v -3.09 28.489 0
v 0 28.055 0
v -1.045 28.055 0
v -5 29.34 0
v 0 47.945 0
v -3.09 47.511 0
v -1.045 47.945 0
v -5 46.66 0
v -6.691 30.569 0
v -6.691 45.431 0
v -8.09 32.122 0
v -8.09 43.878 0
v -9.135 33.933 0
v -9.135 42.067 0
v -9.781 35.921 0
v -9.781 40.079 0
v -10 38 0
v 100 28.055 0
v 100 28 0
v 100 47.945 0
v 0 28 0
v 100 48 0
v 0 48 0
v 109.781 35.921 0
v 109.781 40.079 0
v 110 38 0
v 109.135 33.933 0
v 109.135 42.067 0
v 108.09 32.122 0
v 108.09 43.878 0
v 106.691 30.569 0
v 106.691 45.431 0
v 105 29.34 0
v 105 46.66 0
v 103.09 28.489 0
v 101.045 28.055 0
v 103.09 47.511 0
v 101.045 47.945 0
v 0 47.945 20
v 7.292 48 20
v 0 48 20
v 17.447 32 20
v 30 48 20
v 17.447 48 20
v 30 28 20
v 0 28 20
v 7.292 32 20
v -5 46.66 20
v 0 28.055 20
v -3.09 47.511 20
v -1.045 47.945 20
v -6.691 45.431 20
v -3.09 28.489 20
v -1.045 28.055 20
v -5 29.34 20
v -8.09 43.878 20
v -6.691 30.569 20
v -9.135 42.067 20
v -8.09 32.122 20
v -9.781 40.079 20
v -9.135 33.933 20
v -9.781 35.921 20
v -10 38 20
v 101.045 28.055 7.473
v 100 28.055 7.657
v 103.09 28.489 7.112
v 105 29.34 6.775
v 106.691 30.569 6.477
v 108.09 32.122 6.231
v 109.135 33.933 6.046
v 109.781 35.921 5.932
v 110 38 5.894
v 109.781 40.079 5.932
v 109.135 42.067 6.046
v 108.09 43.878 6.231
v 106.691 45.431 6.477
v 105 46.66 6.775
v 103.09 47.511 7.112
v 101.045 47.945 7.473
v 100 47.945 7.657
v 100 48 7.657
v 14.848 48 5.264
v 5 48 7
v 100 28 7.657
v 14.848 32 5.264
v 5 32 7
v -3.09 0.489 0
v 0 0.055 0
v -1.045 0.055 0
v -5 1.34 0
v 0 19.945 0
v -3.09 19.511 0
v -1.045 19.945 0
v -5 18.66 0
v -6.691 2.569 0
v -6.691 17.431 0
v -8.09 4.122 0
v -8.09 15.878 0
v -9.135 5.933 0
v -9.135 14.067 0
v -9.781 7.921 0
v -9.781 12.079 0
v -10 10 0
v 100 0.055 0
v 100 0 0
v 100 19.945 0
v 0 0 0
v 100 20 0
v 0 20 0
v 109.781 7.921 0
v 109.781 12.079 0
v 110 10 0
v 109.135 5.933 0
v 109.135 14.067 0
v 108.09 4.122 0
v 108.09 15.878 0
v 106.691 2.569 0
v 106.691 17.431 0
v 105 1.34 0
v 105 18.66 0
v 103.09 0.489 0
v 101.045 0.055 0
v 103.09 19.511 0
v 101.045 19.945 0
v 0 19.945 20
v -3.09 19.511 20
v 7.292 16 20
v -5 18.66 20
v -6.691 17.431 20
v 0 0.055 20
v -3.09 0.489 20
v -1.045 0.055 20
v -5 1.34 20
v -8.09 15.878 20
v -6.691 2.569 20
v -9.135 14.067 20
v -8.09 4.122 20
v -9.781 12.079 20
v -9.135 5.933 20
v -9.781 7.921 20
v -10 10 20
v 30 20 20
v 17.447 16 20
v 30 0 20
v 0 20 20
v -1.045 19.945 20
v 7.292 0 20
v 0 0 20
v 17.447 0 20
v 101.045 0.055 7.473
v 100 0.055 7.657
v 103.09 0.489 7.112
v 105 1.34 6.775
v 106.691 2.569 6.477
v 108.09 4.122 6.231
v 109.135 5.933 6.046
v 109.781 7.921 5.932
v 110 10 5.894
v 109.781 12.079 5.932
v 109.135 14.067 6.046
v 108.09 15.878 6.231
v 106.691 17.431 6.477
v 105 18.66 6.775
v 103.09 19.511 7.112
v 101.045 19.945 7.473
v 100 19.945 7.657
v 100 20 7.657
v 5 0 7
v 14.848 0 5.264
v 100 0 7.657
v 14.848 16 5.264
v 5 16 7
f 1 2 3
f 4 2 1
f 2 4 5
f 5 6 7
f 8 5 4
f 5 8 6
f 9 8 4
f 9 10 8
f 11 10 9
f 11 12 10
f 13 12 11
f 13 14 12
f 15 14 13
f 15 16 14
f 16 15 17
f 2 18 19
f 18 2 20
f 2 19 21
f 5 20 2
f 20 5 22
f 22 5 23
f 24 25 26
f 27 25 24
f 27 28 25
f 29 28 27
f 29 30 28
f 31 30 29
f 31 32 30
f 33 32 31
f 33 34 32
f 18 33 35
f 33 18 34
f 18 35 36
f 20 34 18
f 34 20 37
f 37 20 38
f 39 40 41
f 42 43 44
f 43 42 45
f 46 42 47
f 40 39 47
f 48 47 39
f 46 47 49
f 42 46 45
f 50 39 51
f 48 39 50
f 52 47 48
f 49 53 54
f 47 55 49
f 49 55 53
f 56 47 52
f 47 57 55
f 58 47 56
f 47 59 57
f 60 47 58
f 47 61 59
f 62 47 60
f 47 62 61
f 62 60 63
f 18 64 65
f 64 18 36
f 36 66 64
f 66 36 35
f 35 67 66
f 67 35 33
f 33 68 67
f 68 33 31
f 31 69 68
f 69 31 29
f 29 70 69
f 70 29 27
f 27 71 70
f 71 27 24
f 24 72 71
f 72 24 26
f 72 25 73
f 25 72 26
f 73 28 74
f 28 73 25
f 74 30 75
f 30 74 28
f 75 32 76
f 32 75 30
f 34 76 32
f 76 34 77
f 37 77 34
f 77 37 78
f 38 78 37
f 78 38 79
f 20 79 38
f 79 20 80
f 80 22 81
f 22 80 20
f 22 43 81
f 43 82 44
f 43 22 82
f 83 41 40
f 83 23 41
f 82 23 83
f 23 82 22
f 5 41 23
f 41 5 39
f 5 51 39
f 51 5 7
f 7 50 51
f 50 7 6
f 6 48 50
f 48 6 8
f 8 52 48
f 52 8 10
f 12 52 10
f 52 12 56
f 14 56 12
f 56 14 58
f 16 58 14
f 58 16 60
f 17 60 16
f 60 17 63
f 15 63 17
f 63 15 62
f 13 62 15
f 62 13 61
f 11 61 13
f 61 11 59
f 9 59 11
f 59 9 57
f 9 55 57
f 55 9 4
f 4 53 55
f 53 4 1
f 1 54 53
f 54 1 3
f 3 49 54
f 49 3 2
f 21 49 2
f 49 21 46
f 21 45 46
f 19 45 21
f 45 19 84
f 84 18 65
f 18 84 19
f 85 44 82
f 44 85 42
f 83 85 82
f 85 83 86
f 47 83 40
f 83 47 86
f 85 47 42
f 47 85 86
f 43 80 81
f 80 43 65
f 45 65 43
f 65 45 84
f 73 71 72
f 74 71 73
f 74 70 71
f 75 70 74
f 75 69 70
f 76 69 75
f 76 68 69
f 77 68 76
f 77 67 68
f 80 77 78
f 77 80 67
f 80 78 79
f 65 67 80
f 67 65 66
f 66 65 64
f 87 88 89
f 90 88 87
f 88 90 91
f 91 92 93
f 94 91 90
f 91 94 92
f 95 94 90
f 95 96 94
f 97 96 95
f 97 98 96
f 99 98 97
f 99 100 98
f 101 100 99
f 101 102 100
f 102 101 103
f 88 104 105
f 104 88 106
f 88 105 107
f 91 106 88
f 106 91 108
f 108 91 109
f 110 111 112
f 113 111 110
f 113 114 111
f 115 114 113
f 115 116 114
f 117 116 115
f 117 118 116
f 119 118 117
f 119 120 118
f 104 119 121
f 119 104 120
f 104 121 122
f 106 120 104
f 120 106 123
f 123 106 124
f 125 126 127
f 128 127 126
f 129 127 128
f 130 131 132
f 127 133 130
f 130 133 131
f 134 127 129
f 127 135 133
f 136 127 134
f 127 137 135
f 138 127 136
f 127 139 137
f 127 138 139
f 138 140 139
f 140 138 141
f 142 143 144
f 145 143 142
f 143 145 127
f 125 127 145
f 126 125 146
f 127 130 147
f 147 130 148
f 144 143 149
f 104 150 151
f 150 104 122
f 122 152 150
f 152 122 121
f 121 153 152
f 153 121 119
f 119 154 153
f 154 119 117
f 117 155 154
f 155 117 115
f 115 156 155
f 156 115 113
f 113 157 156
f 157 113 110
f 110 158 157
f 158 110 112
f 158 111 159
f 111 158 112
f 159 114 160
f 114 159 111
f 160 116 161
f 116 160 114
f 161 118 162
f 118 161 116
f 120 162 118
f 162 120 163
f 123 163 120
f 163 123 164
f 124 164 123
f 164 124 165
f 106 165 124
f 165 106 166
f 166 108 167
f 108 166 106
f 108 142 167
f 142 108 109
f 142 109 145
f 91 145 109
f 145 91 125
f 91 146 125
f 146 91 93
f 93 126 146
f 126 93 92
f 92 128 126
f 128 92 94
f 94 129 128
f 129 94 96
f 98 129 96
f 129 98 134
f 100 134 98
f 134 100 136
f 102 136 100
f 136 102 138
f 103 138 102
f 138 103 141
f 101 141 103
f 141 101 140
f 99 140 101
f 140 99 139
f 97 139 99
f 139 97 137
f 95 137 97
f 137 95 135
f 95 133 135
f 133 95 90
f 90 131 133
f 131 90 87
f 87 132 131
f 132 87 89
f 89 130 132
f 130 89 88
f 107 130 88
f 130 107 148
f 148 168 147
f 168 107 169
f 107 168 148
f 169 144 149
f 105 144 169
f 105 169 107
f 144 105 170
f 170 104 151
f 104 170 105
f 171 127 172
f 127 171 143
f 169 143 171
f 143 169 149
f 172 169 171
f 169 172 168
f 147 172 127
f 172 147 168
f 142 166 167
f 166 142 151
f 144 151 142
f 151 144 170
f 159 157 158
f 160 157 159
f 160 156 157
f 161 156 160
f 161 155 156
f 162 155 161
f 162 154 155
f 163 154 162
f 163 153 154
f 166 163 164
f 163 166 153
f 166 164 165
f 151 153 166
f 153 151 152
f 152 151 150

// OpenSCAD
//!OpenSCAD

// The tickness ofyour Tablet in mm
Tablet_thickness = 10;
// The stand has adefinedplace wich one do you want:
Version = "both";//[both,right,left]
// The width of the stand
width = 20;

/* [Advanced] */
// The height of the stand (mm)
Height = 20;
// Pay attention to the angle! It must decrease with increasing lengh(mm)
lengh = 100;
// Angle of the flattend end in degrees(mm)
angle = 10;
/* [Hidden] */

if (Version == "both") {
  union(){
    translate([0, (width + 8), 0]){
      difference() {
        linear_extrude( height=Height, twist=0, scale=[1, 1], center=false){
          union(){
            translate([0, (width / 2), 0]){
              circle(r=(width / 2));
            }
            translate([0, 0, 0]){
              square([lengh, width], center=false);
            }
            translate([lengh, (width / 2), 0]){
              circle(r=(width / 2));
            }
          }
        }

        translate([5, 4, 7]){
          rotate([0, angle, 0]){
            cube([Tablet_thickness, (width - 4), 50], center=false);
          }
        }
        translate([30, 0, Height]){
          rotate([0, angle, 0]){
            cube([100, 100, 100], center=false);
          }
        }
      }
    }
    difference() {
      linear_extrude( height=Height, twist=0, scale=[1, 1], center=false){
        union(){
          translate([0, (width / 2), 0]){
            circle(r=(width / 2));
          }
          translate([0, 0, 0]){
            square([lengh, width], center=false);
          }
          translate([lengh, (width / 2), 0]){
            circle(r=(width / 2));
          }
        }
      }

      translate([5, 0, 7]){
        rotate([0, angle, 0]){
          cube([Tablet_thickness, (width - 4), 50], center=false);
        }
      }
      translate([30, 0, Height]){
        rotate([0, angle, 0]){
          cube([100, 100, 100], center=false);
        }
      }
    }
  }
} else if (Version == "right") {
  translate([0, (width + 8), 0]){
    difference() {
      linear_extrude( height=Height, twist=0, scale=[1, 1], center=false){
        union(){
          translate([0, (width / 2), 0]){
            circle(r=(width / 2));
          }
          translate([0, 0, 0]){
            square([lengh, width], center=false);
          }
          translate([lengh, (width / 2), 0]){
            circle(r=(width / 2));
          }
        }
      }

      translate([5, 4, 7]){
        rotate([0, angle, 0]){
          cube([Tablet_thickness, (width - 4), 50], center=false);
        }
      }
      translate([30, 0, Height]){
        rotate([0, angle, 0]){
          cube([100, 100, 100], center=false);
        }
      }
    }
  }
} else {
  difference() {
    linear_extrude( height=Height, twist=0, scale=[1, 1], center=false){
      union(){
        translate([0, (width / 2), 0]){
          circle(r=(width / 2));
        }
        translate([0, 0, 0]){
          square([lengh, width], center=false);
        }
        translate([lengh, (width / 2), 0]){
          circle(r=(width / 2));
        }
      }
    }

    translate([5, 0, 7]){
      rotate([0, angle, 0]){
        cube([Tablet_thickness, (width - 4), 50], center=false);
      }
    }
    translate([30, 0, Height]){
      rotate([0, angle, 0]){
        cube([100, 100, 100], center=false);
      }
    }
  }
}
